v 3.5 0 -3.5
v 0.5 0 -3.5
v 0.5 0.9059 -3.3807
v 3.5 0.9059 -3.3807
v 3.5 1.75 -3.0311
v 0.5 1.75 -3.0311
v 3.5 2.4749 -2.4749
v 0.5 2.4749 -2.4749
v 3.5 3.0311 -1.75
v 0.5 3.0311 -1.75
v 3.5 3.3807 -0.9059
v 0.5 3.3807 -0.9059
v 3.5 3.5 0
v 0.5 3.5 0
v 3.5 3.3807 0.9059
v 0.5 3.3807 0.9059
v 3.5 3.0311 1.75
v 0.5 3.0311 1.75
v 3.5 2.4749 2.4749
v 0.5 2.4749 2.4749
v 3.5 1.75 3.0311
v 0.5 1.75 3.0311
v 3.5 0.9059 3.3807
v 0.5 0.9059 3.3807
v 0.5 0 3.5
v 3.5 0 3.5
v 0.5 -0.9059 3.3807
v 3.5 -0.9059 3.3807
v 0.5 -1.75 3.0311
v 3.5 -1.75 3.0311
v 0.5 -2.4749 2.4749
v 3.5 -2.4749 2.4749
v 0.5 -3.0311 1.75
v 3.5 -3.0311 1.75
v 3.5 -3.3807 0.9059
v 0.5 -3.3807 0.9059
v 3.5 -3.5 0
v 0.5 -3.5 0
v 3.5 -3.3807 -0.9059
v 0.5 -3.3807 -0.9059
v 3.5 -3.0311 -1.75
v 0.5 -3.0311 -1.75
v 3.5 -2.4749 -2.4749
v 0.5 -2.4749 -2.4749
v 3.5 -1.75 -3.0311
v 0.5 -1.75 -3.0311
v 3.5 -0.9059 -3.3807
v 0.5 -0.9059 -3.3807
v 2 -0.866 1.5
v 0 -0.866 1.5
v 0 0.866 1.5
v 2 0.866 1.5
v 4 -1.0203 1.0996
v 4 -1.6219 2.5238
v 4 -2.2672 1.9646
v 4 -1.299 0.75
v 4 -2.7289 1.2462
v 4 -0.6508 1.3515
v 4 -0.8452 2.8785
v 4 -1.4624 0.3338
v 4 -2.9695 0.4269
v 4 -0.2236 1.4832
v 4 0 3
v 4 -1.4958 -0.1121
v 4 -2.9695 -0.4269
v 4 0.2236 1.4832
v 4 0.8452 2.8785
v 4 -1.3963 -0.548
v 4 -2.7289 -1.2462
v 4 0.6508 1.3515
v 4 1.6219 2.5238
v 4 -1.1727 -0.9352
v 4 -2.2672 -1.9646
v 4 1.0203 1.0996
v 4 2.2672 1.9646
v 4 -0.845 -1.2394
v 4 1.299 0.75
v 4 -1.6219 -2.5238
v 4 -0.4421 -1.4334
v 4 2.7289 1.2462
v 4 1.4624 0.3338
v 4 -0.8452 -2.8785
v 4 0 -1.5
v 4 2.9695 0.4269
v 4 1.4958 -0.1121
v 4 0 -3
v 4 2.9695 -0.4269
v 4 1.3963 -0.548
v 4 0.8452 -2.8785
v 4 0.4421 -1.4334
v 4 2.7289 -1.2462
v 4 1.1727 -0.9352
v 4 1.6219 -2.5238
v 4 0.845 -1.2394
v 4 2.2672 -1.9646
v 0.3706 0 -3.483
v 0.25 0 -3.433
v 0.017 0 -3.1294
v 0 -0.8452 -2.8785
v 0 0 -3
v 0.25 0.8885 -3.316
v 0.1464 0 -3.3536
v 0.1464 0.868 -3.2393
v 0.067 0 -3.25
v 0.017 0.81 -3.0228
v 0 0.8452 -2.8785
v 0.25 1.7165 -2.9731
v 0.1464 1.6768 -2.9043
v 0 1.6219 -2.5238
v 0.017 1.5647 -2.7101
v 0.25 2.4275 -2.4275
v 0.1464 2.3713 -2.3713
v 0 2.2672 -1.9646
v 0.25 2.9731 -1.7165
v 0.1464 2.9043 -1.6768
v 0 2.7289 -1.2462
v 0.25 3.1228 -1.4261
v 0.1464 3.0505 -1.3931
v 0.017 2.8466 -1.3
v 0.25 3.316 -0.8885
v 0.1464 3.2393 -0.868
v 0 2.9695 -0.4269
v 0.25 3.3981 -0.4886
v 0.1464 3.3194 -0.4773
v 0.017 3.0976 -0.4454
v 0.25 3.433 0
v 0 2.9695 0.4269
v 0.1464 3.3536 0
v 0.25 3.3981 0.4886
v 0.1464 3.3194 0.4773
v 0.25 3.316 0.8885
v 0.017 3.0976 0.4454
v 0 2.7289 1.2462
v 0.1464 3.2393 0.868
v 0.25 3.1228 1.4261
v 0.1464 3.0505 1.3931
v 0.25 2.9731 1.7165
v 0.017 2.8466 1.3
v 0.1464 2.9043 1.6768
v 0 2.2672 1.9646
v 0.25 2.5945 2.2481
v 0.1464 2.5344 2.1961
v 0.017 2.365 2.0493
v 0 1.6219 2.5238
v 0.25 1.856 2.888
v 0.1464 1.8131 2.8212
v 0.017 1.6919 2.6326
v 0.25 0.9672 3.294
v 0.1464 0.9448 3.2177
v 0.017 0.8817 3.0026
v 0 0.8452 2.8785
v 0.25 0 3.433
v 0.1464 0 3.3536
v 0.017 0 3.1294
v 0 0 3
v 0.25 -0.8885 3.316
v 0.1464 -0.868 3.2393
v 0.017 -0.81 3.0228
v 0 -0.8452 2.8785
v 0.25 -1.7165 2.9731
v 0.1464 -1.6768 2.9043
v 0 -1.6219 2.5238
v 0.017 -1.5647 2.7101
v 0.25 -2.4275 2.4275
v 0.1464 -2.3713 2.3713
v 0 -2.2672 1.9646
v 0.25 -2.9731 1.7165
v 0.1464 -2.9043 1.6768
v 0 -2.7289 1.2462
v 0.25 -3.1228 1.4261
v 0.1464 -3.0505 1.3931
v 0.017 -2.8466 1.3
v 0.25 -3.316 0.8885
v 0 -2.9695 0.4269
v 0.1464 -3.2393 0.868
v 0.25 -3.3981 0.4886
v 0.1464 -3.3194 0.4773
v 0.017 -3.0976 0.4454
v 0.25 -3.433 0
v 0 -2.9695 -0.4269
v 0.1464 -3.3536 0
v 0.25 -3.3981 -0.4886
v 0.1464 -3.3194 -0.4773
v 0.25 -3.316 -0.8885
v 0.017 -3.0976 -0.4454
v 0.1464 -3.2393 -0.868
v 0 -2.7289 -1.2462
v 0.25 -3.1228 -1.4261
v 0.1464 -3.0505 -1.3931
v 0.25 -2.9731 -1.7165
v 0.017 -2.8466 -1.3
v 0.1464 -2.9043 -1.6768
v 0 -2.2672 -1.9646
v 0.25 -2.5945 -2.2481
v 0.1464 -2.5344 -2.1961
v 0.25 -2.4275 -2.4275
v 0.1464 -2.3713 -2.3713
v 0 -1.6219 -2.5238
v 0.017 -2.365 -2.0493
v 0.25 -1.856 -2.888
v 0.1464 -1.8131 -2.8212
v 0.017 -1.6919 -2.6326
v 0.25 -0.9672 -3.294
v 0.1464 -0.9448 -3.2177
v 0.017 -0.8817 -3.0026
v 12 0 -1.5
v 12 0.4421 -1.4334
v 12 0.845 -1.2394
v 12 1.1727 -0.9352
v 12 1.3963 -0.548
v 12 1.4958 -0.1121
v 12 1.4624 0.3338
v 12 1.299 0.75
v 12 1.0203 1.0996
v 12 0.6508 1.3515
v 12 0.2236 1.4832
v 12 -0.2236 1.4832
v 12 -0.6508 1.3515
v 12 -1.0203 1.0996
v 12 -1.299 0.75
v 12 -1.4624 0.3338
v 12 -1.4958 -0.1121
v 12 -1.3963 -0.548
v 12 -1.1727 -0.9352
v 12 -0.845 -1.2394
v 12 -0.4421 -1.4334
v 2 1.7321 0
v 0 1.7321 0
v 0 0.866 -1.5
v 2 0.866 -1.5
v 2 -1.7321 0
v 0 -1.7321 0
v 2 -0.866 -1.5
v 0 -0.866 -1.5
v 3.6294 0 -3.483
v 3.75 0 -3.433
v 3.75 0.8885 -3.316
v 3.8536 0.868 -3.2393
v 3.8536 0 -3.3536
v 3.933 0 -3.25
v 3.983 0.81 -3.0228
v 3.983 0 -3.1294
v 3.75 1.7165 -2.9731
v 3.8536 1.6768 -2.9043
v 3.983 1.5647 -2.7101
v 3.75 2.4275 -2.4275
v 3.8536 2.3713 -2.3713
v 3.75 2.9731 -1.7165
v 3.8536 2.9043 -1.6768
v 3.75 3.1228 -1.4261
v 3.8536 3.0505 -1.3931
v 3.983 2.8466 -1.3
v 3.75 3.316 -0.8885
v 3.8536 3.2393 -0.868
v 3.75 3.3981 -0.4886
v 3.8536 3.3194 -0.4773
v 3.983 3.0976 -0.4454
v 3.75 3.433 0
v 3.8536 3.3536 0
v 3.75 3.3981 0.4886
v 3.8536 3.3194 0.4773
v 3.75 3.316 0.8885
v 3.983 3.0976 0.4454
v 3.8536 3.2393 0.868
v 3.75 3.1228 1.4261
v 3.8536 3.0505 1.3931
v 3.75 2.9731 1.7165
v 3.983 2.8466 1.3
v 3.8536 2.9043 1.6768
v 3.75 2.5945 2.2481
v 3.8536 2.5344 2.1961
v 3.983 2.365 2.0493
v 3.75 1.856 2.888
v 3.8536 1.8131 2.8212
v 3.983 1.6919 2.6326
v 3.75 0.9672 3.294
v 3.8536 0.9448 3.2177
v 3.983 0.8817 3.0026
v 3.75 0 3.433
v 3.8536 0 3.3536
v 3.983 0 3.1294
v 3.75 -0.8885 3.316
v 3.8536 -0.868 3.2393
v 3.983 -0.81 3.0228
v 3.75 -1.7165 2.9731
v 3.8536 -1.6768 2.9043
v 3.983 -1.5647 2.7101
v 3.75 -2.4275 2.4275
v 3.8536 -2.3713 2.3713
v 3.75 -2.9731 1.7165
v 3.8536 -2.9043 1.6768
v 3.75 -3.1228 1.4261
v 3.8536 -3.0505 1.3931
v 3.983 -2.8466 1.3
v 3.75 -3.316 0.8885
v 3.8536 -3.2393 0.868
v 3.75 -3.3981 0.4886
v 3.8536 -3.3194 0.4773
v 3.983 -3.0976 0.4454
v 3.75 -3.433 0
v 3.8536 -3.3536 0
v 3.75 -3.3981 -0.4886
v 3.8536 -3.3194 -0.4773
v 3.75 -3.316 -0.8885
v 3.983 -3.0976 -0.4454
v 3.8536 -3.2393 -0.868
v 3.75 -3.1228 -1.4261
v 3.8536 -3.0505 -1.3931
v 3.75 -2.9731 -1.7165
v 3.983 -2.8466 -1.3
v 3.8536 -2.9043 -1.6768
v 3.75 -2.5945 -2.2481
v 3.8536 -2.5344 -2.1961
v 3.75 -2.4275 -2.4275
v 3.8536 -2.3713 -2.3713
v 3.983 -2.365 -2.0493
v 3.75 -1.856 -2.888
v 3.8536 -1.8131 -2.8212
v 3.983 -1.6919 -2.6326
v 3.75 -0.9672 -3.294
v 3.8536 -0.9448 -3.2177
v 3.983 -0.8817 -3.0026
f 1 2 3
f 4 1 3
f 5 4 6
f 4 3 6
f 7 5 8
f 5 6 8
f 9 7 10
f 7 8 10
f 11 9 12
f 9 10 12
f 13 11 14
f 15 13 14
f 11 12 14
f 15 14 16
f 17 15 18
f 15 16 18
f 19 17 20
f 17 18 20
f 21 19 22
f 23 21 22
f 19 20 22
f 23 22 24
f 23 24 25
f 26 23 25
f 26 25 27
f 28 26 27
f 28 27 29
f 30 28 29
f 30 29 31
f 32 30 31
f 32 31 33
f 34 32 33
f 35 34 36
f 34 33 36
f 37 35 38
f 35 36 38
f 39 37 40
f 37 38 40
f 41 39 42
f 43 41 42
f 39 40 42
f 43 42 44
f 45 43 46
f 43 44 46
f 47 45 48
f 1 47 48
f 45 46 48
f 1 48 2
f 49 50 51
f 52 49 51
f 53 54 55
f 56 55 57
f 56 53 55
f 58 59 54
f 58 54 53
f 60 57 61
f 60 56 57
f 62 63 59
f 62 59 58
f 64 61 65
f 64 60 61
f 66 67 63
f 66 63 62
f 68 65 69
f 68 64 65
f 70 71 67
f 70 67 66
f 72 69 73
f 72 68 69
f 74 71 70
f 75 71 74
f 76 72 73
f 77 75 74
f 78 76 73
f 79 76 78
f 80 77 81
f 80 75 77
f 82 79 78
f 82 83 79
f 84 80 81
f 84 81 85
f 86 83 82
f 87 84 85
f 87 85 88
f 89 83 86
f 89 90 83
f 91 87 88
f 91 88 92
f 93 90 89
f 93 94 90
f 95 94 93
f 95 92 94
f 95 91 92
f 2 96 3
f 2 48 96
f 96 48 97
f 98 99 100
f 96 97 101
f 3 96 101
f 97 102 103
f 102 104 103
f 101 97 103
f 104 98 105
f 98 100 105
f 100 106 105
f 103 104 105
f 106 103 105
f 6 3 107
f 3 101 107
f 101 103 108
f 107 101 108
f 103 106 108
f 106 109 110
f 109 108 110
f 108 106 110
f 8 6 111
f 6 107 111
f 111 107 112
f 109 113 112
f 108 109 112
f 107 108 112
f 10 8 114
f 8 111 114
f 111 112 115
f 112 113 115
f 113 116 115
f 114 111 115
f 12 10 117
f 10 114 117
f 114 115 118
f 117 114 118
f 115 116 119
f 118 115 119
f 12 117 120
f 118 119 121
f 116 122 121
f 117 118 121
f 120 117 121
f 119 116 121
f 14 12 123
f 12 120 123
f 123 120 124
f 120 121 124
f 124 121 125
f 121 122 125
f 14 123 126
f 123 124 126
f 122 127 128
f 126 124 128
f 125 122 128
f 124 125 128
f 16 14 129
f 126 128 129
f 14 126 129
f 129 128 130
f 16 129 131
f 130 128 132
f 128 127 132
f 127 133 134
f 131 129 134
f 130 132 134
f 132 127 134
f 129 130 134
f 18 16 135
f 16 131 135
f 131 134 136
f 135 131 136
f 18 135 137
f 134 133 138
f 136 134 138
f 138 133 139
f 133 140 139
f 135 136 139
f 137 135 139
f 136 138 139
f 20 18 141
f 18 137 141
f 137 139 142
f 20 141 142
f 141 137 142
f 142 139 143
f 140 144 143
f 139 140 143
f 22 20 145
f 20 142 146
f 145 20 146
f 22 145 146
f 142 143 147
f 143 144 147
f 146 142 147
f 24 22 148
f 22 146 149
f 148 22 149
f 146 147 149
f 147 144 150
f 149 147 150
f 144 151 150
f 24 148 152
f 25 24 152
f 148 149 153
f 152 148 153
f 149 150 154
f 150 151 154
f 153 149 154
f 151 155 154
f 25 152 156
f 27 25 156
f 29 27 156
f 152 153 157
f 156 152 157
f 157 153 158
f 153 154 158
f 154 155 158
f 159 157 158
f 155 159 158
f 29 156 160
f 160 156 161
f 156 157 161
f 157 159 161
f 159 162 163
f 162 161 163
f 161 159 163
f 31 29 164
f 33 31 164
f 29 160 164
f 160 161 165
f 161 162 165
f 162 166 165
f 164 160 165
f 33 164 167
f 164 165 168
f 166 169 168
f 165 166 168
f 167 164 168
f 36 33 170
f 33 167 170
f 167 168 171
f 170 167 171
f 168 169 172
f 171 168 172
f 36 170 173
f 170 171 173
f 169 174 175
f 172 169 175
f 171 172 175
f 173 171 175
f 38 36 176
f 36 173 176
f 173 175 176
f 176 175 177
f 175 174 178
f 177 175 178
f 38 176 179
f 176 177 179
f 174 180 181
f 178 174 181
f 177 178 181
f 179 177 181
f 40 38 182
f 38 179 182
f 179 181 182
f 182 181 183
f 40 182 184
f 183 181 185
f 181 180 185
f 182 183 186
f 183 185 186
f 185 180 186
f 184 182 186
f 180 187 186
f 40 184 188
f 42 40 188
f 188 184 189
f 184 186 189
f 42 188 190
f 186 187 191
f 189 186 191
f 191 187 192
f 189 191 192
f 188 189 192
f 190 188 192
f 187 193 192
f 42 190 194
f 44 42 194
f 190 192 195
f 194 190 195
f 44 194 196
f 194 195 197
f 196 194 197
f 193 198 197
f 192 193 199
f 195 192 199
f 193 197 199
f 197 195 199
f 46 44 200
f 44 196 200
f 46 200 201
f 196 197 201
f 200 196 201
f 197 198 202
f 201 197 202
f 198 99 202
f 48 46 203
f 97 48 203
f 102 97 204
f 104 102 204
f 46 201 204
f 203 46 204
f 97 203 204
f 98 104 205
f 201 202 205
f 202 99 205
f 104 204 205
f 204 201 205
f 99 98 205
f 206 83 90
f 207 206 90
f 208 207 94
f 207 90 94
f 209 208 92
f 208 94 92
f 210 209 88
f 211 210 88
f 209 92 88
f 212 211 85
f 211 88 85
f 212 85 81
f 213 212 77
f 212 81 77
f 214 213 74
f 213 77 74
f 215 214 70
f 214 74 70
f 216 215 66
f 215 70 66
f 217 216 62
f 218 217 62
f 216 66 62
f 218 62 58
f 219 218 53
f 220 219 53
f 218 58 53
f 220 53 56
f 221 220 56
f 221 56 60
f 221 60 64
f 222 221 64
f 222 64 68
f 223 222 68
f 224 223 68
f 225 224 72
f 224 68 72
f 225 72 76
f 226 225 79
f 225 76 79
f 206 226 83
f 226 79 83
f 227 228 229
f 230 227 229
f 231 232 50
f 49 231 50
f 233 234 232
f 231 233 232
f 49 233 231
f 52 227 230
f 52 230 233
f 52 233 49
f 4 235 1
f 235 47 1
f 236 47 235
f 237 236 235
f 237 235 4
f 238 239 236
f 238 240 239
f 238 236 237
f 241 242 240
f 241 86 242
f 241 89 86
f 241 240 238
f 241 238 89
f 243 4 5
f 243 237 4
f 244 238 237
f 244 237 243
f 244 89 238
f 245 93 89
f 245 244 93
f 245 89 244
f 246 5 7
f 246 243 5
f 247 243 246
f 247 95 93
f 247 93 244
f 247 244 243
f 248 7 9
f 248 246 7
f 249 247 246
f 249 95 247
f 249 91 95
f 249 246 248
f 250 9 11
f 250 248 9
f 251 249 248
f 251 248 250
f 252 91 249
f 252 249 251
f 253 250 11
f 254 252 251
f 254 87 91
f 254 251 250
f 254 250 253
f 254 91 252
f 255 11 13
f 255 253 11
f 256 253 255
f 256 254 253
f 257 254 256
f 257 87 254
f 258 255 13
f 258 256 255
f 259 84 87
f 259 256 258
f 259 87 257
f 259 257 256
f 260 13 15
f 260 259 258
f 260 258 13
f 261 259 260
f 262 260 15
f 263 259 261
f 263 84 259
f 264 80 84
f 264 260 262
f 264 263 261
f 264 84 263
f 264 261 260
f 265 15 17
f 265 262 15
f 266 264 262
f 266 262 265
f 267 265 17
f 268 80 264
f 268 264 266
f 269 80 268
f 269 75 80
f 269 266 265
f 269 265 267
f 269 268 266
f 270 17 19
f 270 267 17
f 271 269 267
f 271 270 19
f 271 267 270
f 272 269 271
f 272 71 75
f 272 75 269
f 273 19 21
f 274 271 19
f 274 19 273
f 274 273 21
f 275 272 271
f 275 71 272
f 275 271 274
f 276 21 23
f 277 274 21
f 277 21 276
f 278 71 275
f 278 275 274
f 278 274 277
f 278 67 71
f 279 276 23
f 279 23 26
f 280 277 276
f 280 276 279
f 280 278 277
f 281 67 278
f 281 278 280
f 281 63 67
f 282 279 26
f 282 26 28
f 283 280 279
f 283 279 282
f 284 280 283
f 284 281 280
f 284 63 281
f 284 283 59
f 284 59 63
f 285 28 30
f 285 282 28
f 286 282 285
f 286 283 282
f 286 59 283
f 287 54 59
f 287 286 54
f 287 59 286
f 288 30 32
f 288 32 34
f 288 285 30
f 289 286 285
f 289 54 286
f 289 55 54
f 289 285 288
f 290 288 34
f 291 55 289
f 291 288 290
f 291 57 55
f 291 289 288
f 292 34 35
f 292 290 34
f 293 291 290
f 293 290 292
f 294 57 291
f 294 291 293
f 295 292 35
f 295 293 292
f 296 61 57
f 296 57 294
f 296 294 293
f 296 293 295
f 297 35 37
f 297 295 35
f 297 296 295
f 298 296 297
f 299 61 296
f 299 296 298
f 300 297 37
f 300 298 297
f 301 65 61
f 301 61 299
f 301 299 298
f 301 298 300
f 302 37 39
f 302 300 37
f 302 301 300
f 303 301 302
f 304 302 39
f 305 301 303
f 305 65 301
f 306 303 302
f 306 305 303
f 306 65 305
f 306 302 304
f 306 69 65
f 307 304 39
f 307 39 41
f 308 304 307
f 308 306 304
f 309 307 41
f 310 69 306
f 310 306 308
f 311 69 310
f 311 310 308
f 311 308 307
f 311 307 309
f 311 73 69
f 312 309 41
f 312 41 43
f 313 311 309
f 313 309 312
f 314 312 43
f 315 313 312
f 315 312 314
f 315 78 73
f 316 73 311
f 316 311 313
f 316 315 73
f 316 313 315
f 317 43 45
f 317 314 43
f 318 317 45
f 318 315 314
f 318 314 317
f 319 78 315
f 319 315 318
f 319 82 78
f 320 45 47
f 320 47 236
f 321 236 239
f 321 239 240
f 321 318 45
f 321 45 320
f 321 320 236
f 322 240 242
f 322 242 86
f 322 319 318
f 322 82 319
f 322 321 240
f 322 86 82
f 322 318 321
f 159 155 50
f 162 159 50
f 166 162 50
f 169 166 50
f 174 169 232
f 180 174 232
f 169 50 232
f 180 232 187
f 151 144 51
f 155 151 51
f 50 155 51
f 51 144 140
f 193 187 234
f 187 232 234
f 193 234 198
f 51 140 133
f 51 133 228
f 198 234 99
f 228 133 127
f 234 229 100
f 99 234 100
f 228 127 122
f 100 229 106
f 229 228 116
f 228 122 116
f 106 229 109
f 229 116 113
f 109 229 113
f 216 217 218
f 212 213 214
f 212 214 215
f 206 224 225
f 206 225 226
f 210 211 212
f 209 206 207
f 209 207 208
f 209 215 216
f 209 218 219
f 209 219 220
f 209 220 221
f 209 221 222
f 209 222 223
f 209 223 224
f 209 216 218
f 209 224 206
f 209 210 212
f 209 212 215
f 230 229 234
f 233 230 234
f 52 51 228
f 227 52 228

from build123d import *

# Parameters (mm, degrees)
SKETCH1_R           = 3.5
BOSS_EXTRUDE1_DEPTH = 4
SKETCH2_R           = 1.5
BOSS_EXTRUDE2_DEPTH = 8
CUT_EXTRUDE1_DEPTH  = 2
FILLET1_R           = 0.5


with BuildPart() as part:
    # Sketch1 → Boss-Extrude1 (new body)
    with BuildSketch(Plane(origin=(0, 0, 0), x_dir=(0, 0, -1), z_dir=(1, 0, 0))):
        Circle(SKETCH1_R)
    extrude(amount=BOSS_EXTRUDE1_DEPTH)

    # Sketch2 → Boss-Extrude2 (add)
    with BuildSketch(Plane(origin=(4, 0, 0), x_dir=(0, 0, -1), z_dir=(1, 0, 0))):
        Circle(SKETCH2_R)
    extrude(amount=BOSS_EXTRUDE2_DEPTH)

    # Sketch3 → Cut-Extrude1 (cut)
    with BuildSketch(Plane.ZY):
        Polygon((0, 1.732050808), (-1.5, 0.866025404), (-1.5, -0.866025404), (0, -1.732050808), (1.5, -0.866025404), (1.5, 0.866025404), align=None)
    extrude(amount=-CUT_EXTRUDE1_DEPTH, mode=Mode.SUBTRACT)

    # Fillet1
    fillet1_edges = [part.edges().sort_by_distance(p)[0] for p in [
        (0, 0, 3.5),
        (4, 0, 3.5),
    ]]
    fillet(fillet1_edges, radius=FILLET1_R)


solid = part.part
